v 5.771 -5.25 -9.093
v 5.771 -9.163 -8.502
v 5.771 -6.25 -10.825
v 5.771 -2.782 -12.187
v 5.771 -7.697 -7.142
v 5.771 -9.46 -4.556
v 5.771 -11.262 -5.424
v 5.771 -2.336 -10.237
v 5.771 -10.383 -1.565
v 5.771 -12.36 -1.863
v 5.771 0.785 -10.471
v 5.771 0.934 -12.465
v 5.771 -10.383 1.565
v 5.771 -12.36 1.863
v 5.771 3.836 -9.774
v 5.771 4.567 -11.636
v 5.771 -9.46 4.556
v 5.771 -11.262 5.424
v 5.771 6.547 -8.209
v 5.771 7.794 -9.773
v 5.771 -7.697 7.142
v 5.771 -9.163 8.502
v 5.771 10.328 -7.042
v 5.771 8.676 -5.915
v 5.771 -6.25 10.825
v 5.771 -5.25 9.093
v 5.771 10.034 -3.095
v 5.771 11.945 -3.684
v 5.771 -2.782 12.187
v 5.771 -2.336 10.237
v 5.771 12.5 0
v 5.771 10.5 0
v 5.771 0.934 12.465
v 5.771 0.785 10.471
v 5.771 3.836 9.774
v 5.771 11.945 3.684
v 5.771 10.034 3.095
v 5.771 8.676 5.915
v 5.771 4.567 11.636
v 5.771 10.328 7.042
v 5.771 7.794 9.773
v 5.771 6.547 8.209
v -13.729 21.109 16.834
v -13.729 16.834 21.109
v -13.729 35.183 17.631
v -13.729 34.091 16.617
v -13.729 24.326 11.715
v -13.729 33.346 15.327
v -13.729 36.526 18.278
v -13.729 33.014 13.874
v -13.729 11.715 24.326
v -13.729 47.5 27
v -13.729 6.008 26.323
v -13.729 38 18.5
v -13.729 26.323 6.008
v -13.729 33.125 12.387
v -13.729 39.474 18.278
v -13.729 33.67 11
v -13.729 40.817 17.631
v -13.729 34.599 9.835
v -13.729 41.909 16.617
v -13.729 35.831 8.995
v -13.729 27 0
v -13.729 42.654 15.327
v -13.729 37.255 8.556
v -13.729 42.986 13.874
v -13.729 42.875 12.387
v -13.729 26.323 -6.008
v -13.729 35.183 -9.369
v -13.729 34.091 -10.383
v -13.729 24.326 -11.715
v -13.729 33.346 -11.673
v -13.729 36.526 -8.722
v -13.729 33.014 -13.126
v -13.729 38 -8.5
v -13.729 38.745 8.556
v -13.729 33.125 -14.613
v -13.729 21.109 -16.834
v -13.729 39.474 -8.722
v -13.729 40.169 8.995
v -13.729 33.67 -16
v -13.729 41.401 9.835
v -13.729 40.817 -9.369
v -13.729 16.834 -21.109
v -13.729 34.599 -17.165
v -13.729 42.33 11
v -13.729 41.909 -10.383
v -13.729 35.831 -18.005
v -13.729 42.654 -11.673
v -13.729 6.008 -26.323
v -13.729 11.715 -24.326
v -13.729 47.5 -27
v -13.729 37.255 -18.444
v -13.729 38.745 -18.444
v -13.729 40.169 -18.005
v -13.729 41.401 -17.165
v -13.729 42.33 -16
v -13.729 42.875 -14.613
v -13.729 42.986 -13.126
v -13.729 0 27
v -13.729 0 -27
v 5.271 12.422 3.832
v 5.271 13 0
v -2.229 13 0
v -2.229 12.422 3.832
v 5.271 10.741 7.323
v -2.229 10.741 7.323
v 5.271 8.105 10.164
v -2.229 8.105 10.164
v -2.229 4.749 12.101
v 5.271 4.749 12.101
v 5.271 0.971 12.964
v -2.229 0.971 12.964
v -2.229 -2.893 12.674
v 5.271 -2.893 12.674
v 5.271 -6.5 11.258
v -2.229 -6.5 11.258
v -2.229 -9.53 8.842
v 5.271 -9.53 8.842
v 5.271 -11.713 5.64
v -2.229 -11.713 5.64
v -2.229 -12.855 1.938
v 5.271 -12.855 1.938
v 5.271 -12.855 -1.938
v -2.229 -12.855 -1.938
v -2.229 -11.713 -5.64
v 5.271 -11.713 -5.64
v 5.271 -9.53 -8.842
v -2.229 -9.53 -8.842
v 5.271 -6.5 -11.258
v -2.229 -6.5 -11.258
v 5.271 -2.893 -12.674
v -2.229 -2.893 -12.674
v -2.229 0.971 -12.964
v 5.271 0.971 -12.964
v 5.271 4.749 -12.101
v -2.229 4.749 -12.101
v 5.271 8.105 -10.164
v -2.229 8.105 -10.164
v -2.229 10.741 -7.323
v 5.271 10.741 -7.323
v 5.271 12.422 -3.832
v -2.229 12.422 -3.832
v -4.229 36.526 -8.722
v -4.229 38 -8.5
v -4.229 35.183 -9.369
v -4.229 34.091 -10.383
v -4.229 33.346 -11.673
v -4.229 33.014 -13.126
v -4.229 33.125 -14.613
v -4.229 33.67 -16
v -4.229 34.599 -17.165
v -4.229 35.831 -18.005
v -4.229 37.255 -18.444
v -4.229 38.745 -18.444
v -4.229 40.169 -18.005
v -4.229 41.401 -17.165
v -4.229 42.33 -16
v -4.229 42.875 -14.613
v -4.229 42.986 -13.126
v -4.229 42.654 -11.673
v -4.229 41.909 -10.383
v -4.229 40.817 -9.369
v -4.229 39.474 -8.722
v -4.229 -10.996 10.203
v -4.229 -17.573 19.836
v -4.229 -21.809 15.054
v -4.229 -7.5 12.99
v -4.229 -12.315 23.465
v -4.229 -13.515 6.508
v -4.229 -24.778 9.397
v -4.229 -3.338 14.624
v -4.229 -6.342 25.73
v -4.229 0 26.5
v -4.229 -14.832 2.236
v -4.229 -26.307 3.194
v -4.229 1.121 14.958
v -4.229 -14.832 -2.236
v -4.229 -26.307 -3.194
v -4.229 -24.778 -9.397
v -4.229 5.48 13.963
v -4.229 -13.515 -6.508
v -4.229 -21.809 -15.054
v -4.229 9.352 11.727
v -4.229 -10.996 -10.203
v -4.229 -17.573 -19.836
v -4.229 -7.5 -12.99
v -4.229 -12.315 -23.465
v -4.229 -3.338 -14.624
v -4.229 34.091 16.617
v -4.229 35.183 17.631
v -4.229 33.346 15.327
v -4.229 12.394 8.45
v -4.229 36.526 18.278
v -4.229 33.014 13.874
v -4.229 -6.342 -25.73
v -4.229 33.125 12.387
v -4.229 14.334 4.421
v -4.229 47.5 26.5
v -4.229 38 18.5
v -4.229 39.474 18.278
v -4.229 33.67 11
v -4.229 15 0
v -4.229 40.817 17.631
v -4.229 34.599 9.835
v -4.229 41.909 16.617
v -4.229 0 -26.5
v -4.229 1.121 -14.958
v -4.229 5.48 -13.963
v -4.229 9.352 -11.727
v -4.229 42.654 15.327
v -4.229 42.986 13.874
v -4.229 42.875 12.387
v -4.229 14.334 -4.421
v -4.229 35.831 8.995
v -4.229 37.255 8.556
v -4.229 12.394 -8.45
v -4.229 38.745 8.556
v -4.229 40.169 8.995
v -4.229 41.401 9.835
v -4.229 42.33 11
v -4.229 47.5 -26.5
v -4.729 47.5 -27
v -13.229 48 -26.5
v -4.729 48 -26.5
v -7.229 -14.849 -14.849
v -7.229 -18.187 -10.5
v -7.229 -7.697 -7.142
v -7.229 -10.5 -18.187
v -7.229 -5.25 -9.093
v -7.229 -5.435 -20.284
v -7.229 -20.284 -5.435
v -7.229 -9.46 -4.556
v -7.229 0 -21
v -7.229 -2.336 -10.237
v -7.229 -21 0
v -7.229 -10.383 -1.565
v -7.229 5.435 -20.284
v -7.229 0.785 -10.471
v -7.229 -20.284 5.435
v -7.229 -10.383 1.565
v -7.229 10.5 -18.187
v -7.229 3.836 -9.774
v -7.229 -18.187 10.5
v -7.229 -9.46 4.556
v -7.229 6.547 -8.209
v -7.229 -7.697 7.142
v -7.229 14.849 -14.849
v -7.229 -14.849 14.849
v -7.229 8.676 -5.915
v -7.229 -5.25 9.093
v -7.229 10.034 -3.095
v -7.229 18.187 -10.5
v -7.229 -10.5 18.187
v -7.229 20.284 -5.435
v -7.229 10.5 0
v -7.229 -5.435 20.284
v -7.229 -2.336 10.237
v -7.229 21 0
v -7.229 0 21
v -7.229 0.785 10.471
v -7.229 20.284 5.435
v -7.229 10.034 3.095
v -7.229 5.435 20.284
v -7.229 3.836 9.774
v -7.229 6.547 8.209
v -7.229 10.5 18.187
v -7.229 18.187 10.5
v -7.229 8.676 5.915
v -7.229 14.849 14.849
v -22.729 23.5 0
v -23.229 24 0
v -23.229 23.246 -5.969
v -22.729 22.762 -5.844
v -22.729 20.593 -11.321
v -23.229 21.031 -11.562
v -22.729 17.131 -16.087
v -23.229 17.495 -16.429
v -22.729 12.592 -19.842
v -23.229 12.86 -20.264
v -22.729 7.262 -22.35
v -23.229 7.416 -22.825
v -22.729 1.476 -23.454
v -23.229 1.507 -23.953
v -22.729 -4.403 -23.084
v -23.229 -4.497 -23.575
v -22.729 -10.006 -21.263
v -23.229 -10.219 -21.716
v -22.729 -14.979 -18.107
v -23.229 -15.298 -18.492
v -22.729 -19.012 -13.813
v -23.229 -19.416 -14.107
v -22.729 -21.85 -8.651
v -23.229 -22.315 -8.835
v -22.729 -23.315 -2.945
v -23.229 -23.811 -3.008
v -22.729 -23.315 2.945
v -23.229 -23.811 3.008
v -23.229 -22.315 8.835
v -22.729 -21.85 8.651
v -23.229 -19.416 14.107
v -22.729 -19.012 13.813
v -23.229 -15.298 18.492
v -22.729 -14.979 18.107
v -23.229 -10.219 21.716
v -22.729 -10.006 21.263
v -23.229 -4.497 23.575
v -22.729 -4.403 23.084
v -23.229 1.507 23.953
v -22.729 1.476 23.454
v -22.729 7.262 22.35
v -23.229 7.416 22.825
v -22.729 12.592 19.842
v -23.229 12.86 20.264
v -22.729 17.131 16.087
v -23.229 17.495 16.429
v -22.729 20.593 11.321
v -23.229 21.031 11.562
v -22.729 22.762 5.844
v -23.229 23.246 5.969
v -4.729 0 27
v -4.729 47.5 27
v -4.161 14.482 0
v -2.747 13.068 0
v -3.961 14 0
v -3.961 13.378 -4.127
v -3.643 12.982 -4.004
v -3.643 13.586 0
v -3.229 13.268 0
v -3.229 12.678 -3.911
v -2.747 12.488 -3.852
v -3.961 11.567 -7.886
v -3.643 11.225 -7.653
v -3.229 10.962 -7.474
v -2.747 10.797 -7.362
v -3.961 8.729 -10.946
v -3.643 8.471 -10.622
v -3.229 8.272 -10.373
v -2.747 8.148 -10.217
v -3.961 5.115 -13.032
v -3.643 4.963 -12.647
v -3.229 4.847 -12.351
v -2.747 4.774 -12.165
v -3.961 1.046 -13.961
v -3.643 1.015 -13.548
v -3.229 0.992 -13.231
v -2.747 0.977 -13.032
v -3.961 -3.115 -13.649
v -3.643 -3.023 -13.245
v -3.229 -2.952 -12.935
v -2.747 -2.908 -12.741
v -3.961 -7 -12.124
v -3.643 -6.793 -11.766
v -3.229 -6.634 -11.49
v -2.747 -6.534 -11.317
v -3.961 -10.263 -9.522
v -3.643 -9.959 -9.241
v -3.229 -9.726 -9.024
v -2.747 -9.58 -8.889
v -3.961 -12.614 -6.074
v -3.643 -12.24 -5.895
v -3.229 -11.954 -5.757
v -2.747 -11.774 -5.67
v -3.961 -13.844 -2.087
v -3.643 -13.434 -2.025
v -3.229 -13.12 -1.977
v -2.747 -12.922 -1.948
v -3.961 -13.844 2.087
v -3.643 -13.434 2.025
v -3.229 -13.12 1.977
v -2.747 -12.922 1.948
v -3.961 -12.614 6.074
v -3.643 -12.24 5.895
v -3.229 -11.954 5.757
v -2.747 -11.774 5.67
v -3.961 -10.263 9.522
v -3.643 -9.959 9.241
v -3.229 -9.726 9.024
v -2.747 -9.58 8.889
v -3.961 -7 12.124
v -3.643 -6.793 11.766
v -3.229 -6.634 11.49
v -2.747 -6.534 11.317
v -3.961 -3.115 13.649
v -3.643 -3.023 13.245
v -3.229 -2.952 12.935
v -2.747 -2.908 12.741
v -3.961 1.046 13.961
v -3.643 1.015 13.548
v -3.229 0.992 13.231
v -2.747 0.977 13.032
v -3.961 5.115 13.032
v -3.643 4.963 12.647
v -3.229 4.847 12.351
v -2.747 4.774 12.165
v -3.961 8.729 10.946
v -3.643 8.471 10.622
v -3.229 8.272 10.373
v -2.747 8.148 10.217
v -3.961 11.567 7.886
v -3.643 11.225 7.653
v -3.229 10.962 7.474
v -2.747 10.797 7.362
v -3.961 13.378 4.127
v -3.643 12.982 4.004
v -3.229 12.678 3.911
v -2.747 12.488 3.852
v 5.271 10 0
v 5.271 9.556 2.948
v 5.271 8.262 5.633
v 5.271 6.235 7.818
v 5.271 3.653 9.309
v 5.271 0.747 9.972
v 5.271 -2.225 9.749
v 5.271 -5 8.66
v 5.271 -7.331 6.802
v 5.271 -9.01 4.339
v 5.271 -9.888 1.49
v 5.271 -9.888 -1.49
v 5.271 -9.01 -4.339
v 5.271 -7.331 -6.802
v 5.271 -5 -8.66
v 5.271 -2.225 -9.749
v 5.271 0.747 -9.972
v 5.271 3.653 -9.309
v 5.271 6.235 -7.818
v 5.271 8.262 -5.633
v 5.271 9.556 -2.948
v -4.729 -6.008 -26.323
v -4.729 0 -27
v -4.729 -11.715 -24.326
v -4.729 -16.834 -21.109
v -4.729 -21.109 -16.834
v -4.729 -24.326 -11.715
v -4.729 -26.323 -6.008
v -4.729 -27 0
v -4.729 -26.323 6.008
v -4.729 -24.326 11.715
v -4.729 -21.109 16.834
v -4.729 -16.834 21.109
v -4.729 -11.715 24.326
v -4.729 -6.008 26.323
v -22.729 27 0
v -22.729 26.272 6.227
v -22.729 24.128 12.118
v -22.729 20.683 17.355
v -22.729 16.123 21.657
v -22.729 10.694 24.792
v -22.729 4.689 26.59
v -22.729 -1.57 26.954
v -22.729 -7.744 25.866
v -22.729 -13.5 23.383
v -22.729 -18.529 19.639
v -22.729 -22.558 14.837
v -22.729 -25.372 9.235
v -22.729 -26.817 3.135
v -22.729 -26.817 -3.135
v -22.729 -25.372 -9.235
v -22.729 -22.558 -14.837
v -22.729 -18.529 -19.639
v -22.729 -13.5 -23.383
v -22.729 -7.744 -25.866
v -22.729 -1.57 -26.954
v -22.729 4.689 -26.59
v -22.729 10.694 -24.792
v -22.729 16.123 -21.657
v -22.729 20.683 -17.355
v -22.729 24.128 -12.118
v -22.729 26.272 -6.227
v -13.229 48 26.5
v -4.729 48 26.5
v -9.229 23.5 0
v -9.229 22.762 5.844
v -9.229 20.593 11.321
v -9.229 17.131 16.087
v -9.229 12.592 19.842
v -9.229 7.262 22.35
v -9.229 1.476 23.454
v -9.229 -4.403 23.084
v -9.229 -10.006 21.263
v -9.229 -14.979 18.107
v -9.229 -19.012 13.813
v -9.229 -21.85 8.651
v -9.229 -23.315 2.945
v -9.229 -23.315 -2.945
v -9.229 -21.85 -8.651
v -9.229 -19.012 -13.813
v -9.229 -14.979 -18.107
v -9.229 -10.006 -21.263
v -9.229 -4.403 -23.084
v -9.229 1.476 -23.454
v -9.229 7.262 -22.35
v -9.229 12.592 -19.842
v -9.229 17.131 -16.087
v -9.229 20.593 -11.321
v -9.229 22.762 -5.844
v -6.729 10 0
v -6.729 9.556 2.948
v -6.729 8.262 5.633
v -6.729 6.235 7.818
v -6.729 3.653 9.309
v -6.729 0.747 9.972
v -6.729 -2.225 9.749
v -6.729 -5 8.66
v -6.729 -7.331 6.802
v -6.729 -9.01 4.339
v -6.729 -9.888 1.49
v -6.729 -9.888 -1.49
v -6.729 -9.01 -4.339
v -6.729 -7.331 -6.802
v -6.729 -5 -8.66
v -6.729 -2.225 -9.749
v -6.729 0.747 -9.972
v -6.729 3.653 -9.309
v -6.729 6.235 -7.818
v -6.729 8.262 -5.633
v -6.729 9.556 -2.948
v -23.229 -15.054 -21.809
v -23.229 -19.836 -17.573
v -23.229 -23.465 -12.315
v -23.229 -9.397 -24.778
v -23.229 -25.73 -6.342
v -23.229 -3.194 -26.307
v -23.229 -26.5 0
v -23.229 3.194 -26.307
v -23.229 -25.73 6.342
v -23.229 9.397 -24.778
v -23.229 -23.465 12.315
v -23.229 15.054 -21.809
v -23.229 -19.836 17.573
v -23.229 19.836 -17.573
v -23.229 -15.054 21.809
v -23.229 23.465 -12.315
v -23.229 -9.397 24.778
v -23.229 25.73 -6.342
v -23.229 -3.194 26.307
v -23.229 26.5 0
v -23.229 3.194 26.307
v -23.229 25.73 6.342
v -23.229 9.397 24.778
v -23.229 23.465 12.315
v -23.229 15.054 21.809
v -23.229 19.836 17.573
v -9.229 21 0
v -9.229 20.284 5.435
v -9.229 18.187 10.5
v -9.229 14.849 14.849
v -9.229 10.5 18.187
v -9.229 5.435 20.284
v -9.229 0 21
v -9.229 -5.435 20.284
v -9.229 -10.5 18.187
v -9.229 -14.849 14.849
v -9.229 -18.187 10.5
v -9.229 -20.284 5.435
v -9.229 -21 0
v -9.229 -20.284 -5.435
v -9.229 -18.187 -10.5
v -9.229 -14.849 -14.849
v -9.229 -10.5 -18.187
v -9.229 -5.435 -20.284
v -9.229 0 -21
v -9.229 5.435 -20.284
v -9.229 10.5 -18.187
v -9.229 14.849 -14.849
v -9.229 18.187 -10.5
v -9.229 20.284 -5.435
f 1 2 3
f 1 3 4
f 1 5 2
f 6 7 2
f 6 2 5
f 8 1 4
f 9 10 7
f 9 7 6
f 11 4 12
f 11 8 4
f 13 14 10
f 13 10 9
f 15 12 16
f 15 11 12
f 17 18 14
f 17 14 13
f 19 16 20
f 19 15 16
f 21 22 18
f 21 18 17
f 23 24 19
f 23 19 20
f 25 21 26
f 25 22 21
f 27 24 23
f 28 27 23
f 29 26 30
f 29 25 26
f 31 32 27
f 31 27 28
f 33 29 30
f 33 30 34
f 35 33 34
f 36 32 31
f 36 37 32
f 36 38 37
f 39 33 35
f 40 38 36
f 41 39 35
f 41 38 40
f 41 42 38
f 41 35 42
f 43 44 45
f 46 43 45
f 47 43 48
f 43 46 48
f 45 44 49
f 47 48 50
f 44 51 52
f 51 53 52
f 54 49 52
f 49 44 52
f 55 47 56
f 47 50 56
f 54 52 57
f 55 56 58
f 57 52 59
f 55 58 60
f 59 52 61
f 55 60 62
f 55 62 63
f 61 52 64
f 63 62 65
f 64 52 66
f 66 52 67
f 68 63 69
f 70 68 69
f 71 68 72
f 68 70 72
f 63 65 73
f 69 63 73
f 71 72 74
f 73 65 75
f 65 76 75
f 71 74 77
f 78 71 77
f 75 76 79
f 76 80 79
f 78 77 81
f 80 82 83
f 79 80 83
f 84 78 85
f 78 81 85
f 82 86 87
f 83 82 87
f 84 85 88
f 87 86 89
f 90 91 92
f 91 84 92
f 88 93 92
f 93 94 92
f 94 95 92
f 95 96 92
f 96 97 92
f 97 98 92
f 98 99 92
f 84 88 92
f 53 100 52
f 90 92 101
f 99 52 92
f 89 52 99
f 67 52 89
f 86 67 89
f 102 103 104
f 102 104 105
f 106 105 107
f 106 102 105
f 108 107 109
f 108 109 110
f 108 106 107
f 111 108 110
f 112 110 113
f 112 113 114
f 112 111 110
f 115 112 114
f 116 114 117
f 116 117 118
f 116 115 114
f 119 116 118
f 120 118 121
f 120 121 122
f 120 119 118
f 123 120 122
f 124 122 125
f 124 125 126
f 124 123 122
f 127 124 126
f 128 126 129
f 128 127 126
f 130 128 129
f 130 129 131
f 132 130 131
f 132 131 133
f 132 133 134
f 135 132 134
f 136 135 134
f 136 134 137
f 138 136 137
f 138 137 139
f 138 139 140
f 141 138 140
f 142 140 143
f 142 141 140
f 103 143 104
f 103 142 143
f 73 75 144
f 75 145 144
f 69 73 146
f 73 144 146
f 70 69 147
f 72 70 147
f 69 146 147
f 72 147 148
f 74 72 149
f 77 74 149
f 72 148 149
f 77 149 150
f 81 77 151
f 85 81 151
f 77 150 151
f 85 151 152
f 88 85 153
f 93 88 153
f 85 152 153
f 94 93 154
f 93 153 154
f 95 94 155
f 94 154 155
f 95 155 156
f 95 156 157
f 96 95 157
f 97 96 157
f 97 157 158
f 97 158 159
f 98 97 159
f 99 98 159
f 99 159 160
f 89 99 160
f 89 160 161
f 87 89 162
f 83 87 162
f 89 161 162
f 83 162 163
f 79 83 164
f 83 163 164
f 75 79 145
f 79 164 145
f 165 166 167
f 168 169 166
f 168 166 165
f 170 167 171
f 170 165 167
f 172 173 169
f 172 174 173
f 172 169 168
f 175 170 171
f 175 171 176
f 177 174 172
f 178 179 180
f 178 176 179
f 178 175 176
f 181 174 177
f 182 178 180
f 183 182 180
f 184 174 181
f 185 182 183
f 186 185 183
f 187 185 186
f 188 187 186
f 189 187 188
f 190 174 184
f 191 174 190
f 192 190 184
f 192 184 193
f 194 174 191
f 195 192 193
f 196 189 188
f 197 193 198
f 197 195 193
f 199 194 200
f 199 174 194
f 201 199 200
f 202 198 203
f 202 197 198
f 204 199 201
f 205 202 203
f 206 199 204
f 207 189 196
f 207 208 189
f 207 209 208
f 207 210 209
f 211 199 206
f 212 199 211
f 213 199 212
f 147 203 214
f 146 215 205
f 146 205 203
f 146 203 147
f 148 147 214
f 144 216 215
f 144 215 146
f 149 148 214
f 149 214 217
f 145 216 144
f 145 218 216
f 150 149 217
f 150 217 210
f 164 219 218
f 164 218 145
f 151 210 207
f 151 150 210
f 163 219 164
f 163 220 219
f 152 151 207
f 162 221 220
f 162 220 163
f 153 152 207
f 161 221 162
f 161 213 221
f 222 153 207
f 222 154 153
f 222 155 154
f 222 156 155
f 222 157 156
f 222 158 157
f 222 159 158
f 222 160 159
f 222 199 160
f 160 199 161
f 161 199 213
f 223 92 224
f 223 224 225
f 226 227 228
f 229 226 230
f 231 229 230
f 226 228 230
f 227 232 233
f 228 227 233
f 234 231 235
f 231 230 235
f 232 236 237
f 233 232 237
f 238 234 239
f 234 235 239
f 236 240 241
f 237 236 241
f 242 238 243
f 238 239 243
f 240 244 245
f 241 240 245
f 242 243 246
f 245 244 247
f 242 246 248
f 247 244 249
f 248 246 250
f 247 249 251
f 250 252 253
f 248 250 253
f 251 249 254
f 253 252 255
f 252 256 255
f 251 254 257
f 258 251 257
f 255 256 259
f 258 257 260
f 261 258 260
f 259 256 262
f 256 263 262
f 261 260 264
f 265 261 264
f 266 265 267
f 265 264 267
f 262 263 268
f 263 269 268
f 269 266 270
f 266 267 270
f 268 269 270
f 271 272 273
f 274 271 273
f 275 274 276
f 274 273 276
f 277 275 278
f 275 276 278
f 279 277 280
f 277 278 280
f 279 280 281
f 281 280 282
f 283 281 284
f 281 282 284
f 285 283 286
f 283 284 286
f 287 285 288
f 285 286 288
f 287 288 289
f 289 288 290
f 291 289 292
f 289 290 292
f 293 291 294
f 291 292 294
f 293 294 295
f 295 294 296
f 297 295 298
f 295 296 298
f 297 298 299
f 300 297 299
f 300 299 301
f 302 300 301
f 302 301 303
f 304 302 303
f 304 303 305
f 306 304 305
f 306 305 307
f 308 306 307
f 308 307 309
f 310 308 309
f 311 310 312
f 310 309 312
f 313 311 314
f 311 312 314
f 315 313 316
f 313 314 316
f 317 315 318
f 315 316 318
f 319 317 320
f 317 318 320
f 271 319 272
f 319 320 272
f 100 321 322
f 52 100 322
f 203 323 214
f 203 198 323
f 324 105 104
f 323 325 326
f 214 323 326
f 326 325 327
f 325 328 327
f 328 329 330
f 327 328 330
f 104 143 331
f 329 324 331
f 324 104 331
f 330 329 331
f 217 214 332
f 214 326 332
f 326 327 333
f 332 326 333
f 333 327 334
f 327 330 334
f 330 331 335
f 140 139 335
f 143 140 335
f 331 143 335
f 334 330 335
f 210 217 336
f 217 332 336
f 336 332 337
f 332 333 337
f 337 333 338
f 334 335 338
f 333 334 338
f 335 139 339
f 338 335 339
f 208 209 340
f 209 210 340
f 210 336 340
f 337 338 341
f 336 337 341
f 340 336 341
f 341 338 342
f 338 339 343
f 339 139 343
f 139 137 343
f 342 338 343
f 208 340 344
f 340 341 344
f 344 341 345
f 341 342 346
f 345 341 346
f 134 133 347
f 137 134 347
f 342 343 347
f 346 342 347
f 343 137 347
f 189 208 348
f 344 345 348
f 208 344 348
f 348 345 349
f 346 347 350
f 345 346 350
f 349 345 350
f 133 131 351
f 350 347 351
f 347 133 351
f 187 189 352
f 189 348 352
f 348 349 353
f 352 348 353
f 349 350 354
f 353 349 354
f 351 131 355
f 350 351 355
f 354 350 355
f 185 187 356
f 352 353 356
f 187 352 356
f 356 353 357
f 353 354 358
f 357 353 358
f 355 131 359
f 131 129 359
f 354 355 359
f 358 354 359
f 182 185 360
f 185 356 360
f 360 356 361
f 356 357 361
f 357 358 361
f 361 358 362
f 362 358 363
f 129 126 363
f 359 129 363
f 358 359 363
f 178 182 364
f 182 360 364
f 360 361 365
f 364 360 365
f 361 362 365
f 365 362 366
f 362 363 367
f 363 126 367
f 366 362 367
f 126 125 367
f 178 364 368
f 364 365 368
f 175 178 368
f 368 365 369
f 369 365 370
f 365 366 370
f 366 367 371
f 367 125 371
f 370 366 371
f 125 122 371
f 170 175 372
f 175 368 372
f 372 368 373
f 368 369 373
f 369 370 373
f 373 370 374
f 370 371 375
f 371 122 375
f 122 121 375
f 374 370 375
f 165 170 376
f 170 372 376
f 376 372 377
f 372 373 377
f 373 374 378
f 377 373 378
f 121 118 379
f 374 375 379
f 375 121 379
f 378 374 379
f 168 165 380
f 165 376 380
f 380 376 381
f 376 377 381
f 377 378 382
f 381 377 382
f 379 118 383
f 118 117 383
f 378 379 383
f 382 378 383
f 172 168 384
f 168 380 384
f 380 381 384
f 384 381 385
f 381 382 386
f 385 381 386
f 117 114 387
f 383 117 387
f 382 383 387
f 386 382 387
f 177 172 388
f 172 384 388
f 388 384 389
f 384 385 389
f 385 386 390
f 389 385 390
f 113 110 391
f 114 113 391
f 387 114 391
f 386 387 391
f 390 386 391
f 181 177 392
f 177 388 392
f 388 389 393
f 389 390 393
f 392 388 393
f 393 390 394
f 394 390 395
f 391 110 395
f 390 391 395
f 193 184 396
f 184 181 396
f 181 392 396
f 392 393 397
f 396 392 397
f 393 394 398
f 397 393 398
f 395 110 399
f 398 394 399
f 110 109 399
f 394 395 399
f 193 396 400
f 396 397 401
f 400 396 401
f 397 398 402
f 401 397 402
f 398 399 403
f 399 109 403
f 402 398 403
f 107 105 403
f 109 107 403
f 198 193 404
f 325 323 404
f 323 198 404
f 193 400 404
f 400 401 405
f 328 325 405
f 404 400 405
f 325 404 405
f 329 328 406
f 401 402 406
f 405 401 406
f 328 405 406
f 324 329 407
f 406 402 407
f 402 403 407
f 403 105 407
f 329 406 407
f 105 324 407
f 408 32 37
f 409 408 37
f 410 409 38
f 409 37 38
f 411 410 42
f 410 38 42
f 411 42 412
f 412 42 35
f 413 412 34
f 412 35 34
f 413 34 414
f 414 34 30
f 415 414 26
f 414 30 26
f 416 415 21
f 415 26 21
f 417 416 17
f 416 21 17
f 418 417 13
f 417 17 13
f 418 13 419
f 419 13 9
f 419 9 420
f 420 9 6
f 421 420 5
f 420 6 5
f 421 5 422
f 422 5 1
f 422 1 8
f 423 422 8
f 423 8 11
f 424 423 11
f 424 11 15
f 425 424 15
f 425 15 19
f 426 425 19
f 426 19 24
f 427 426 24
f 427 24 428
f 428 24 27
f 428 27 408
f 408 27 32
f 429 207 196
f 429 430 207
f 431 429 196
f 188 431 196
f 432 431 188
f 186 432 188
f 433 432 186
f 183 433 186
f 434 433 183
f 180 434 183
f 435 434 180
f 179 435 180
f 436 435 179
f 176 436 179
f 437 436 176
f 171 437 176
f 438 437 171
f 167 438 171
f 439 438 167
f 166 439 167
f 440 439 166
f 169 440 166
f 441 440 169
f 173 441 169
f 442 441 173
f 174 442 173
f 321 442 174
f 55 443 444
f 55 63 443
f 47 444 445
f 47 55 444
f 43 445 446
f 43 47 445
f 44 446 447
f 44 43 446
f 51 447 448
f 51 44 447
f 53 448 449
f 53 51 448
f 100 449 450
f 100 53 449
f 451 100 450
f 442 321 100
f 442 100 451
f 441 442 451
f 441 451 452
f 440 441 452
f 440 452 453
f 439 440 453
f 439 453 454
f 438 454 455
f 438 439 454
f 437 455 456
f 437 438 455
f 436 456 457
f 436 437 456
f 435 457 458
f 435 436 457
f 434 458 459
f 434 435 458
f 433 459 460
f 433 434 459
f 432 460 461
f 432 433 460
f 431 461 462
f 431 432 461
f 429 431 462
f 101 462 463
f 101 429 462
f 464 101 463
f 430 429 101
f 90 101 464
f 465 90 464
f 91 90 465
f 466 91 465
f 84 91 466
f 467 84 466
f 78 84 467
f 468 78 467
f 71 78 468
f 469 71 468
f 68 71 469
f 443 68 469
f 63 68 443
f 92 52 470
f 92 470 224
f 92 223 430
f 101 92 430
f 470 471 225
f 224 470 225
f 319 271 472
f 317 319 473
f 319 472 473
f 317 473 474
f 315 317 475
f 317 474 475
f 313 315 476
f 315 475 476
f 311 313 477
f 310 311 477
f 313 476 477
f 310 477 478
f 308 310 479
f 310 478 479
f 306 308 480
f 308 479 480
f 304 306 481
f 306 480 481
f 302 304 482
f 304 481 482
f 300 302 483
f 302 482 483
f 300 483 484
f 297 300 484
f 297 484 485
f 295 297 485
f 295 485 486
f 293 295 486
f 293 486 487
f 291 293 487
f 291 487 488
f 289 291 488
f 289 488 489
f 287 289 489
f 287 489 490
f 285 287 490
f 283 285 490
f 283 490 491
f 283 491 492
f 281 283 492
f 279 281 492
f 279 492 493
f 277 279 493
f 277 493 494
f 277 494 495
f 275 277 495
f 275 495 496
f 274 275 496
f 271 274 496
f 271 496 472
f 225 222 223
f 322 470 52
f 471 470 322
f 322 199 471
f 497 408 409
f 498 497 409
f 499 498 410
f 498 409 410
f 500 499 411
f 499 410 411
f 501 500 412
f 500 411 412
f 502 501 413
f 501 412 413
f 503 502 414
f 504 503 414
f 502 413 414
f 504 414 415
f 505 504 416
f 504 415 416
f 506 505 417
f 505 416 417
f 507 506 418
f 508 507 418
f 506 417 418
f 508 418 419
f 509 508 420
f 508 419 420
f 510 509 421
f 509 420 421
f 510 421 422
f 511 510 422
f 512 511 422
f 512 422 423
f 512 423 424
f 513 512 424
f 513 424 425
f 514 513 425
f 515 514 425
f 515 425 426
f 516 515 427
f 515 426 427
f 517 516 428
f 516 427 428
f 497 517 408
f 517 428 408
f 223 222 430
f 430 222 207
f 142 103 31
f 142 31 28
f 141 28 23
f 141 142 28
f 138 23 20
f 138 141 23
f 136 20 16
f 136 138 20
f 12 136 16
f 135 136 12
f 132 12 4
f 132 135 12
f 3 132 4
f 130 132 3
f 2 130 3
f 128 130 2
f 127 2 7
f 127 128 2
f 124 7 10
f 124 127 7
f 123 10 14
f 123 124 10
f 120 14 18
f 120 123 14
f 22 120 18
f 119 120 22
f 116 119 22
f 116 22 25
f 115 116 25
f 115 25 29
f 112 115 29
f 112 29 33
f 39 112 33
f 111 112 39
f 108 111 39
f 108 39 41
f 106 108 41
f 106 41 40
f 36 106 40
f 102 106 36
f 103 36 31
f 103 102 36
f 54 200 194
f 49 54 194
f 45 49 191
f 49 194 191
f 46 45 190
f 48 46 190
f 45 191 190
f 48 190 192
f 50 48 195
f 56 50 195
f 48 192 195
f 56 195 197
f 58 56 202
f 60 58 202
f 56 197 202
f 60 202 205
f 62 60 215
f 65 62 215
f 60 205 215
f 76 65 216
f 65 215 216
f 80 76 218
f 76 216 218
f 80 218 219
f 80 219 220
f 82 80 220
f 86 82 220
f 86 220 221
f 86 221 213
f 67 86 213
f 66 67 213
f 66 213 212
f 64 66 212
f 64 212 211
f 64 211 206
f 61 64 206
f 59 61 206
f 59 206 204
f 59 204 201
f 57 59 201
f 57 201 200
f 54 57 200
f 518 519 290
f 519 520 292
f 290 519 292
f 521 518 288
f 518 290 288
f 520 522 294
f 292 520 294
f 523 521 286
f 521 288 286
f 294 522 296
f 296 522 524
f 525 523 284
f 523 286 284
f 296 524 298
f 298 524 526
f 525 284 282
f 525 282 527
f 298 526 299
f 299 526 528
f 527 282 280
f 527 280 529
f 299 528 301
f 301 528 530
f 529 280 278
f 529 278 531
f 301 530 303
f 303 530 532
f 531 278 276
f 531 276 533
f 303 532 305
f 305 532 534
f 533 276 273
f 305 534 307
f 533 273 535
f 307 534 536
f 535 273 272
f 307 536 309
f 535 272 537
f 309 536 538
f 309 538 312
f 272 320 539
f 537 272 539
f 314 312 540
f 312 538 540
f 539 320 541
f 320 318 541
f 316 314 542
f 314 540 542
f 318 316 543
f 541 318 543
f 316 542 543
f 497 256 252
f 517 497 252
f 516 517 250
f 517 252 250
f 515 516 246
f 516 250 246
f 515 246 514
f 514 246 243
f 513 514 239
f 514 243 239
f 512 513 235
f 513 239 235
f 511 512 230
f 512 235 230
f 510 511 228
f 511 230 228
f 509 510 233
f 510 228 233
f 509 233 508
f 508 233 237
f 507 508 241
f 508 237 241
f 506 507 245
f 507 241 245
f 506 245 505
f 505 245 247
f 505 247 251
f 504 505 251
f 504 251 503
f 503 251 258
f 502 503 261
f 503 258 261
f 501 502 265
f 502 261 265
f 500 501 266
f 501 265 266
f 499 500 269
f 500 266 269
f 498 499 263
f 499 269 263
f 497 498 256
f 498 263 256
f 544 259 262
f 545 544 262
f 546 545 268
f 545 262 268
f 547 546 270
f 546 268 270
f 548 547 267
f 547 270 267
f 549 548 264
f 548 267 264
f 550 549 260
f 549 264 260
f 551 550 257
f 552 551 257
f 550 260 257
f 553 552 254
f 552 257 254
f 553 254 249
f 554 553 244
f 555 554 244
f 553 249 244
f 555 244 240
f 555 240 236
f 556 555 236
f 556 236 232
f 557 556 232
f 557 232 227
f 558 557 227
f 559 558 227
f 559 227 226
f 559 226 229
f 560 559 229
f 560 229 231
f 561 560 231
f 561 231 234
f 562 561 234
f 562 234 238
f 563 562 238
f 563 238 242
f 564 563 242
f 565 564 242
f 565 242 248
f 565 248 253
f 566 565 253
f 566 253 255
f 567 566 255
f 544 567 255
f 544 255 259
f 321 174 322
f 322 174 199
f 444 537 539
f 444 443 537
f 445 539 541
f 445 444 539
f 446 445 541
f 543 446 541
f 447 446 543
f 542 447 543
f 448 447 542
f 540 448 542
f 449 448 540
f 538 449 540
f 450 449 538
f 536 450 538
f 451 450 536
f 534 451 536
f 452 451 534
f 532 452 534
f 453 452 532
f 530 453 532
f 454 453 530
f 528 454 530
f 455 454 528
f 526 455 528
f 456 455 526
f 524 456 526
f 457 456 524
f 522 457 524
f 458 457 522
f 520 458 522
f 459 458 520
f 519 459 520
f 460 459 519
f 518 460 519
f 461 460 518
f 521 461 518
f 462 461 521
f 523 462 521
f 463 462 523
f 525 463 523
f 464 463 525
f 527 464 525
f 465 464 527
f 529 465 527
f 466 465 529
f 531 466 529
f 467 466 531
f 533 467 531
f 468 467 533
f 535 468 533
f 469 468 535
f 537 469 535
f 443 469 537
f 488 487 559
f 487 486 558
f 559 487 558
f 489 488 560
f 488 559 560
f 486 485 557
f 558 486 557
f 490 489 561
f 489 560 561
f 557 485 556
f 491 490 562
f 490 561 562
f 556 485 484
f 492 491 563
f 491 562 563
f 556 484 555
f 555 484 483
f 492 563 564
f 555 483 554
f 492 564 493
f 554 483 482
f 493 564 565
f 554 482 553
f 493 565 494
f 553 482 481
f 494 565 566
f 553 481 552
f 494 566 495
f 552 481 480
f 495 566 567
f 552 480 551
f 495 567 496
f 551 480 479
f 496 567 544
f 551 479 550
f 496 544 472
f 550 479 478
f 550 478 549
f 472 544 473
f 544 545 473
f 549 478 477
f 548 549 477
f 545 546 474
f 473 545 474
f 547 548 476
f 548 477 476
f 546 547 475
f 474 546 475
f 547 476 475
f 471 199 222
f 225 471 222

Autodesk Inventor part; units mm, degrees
ref_plane "YZ Plane" through (0, 0, 0) normal (1, 0, 0) x (0, 1, 0)
ref_plane "XZ Plane" through (0, 0, 0) normal (0, 1, 0) x (-1, 0, 0)
ref_plane "XY Plane" through (0, 0, 0) normal (0, 0, 1) x (1, 0, 0)
sketch "Schizzo3" plane through (0, 0, 0) normal (0, 0, 1) x (1, 0, 0)
  line L0 (-66.1458, 0) -> (66.1458, 0)
  line L1 (-4.2292, 27) -> (-4.2292, 13)
  line L2 (-4.2292, 13) -> (5.7708, 13)
  line L3 (5.7708, 13) -> (5.7708, 10)
  line L4 (-23.2292, 27) -> (-23.2292, 23.5)
  line L5 (-23.2292, 23.5) -> (-9.2292, 23.5)
  line L6 (-9.2292, 23.5) -> (-9.2292, 21)
  line L7 (-9.2292, 21) -> (-7.2292, 21)
  line L8 (-7.2292, 21) -> (-7.2292, 10)
  line L9 (-7.2292, 10) -> (5.7708, 10)
  line L10 (-23.2292, 27) -> (-4.2292, 27)
  point P0 (0, 0)
  point P1 (0, 0)
  dimension "d8" = 20
  dimension "d9" = 26
  dimension "d10" = 10
  dimension "d11" = 47
  dimension "d13" = 42
  dimension "d14" = 5
  dimension "d17" = 3
  dimension "d19" = 3.5
  dimension "d21" = 14
revolve "Rivoluzione1" add sketch "Schizzo3" angle 360 about axis through (-66.1458, 0, 0) along (1, 0, 0)
fillet "Raccordo1" radius 2 1 edges at (-4.2292, -13, 0)
chamfer "Smusso1" distance 0.5 angle 45 4 edges at (-23.2292, -23.5, 0) (-7.2292, -10, 0) (5.7708, -10, 0) (5.7708, -13, 0)
sketch "Schizzo4" plane through (-4.2292, 0, 0) normal (1, 0, 0) x (0, 0, -1)
  circle A0 centre (0, 0) radius 27 projected
  circle A1 centre (0, 0) radius 27
  line L0 (-27, 0) -> (-27, 48)
  line L1 (-27, 48) -> (27, 48)
  line L2 (27, 48) -> (27, 0)
  dimension "d27" = 48
extrude "Estrusione3" add sketch "Schizzo4" against normal blind 9.5 contours A0 L0 L1 L2
chamfer "Smusso2" distance 0.5 angle 45 8 edges at (-4.2292, 24, 27) (-4.2292, -27, 0) (-4.2292, 24, -27) (-23.2292, -27, 0) (-4.2292, 48, 0) (-13.7292, 48, 0) (-8.9792, 48, -27) (-8.9792, 48, 27)
sketch "Schizzo5" plane through (-13.7292, 0, 0) normal (-1, 0, 0) x (0, 0, 1)
  line L0 (27, 0) -> (27, 47.5) projected
  line L1 (26.5, 48) -> (-26.5, 48) projected
  line L2 (-27, 47.5) -> (-27, 0) projected
  point P0 (0, 0)
  point P1 (13.5, 38)
  point P2 (-13.5, 38)
  dimension "d33" = 13.5
  dimension "d34" = 10
  dimension "d35" = 13.5
hole "Foro1" at (-13.7292, 38, 13.5) at (-13.7292, 38, -13.5) direction (1, 0, 0) diameter 10 end through all
equation "\"d35\" = d33"
properties part number "Porta cuscinetto puleggia operatrice" material "Acciaio inossidabile"
